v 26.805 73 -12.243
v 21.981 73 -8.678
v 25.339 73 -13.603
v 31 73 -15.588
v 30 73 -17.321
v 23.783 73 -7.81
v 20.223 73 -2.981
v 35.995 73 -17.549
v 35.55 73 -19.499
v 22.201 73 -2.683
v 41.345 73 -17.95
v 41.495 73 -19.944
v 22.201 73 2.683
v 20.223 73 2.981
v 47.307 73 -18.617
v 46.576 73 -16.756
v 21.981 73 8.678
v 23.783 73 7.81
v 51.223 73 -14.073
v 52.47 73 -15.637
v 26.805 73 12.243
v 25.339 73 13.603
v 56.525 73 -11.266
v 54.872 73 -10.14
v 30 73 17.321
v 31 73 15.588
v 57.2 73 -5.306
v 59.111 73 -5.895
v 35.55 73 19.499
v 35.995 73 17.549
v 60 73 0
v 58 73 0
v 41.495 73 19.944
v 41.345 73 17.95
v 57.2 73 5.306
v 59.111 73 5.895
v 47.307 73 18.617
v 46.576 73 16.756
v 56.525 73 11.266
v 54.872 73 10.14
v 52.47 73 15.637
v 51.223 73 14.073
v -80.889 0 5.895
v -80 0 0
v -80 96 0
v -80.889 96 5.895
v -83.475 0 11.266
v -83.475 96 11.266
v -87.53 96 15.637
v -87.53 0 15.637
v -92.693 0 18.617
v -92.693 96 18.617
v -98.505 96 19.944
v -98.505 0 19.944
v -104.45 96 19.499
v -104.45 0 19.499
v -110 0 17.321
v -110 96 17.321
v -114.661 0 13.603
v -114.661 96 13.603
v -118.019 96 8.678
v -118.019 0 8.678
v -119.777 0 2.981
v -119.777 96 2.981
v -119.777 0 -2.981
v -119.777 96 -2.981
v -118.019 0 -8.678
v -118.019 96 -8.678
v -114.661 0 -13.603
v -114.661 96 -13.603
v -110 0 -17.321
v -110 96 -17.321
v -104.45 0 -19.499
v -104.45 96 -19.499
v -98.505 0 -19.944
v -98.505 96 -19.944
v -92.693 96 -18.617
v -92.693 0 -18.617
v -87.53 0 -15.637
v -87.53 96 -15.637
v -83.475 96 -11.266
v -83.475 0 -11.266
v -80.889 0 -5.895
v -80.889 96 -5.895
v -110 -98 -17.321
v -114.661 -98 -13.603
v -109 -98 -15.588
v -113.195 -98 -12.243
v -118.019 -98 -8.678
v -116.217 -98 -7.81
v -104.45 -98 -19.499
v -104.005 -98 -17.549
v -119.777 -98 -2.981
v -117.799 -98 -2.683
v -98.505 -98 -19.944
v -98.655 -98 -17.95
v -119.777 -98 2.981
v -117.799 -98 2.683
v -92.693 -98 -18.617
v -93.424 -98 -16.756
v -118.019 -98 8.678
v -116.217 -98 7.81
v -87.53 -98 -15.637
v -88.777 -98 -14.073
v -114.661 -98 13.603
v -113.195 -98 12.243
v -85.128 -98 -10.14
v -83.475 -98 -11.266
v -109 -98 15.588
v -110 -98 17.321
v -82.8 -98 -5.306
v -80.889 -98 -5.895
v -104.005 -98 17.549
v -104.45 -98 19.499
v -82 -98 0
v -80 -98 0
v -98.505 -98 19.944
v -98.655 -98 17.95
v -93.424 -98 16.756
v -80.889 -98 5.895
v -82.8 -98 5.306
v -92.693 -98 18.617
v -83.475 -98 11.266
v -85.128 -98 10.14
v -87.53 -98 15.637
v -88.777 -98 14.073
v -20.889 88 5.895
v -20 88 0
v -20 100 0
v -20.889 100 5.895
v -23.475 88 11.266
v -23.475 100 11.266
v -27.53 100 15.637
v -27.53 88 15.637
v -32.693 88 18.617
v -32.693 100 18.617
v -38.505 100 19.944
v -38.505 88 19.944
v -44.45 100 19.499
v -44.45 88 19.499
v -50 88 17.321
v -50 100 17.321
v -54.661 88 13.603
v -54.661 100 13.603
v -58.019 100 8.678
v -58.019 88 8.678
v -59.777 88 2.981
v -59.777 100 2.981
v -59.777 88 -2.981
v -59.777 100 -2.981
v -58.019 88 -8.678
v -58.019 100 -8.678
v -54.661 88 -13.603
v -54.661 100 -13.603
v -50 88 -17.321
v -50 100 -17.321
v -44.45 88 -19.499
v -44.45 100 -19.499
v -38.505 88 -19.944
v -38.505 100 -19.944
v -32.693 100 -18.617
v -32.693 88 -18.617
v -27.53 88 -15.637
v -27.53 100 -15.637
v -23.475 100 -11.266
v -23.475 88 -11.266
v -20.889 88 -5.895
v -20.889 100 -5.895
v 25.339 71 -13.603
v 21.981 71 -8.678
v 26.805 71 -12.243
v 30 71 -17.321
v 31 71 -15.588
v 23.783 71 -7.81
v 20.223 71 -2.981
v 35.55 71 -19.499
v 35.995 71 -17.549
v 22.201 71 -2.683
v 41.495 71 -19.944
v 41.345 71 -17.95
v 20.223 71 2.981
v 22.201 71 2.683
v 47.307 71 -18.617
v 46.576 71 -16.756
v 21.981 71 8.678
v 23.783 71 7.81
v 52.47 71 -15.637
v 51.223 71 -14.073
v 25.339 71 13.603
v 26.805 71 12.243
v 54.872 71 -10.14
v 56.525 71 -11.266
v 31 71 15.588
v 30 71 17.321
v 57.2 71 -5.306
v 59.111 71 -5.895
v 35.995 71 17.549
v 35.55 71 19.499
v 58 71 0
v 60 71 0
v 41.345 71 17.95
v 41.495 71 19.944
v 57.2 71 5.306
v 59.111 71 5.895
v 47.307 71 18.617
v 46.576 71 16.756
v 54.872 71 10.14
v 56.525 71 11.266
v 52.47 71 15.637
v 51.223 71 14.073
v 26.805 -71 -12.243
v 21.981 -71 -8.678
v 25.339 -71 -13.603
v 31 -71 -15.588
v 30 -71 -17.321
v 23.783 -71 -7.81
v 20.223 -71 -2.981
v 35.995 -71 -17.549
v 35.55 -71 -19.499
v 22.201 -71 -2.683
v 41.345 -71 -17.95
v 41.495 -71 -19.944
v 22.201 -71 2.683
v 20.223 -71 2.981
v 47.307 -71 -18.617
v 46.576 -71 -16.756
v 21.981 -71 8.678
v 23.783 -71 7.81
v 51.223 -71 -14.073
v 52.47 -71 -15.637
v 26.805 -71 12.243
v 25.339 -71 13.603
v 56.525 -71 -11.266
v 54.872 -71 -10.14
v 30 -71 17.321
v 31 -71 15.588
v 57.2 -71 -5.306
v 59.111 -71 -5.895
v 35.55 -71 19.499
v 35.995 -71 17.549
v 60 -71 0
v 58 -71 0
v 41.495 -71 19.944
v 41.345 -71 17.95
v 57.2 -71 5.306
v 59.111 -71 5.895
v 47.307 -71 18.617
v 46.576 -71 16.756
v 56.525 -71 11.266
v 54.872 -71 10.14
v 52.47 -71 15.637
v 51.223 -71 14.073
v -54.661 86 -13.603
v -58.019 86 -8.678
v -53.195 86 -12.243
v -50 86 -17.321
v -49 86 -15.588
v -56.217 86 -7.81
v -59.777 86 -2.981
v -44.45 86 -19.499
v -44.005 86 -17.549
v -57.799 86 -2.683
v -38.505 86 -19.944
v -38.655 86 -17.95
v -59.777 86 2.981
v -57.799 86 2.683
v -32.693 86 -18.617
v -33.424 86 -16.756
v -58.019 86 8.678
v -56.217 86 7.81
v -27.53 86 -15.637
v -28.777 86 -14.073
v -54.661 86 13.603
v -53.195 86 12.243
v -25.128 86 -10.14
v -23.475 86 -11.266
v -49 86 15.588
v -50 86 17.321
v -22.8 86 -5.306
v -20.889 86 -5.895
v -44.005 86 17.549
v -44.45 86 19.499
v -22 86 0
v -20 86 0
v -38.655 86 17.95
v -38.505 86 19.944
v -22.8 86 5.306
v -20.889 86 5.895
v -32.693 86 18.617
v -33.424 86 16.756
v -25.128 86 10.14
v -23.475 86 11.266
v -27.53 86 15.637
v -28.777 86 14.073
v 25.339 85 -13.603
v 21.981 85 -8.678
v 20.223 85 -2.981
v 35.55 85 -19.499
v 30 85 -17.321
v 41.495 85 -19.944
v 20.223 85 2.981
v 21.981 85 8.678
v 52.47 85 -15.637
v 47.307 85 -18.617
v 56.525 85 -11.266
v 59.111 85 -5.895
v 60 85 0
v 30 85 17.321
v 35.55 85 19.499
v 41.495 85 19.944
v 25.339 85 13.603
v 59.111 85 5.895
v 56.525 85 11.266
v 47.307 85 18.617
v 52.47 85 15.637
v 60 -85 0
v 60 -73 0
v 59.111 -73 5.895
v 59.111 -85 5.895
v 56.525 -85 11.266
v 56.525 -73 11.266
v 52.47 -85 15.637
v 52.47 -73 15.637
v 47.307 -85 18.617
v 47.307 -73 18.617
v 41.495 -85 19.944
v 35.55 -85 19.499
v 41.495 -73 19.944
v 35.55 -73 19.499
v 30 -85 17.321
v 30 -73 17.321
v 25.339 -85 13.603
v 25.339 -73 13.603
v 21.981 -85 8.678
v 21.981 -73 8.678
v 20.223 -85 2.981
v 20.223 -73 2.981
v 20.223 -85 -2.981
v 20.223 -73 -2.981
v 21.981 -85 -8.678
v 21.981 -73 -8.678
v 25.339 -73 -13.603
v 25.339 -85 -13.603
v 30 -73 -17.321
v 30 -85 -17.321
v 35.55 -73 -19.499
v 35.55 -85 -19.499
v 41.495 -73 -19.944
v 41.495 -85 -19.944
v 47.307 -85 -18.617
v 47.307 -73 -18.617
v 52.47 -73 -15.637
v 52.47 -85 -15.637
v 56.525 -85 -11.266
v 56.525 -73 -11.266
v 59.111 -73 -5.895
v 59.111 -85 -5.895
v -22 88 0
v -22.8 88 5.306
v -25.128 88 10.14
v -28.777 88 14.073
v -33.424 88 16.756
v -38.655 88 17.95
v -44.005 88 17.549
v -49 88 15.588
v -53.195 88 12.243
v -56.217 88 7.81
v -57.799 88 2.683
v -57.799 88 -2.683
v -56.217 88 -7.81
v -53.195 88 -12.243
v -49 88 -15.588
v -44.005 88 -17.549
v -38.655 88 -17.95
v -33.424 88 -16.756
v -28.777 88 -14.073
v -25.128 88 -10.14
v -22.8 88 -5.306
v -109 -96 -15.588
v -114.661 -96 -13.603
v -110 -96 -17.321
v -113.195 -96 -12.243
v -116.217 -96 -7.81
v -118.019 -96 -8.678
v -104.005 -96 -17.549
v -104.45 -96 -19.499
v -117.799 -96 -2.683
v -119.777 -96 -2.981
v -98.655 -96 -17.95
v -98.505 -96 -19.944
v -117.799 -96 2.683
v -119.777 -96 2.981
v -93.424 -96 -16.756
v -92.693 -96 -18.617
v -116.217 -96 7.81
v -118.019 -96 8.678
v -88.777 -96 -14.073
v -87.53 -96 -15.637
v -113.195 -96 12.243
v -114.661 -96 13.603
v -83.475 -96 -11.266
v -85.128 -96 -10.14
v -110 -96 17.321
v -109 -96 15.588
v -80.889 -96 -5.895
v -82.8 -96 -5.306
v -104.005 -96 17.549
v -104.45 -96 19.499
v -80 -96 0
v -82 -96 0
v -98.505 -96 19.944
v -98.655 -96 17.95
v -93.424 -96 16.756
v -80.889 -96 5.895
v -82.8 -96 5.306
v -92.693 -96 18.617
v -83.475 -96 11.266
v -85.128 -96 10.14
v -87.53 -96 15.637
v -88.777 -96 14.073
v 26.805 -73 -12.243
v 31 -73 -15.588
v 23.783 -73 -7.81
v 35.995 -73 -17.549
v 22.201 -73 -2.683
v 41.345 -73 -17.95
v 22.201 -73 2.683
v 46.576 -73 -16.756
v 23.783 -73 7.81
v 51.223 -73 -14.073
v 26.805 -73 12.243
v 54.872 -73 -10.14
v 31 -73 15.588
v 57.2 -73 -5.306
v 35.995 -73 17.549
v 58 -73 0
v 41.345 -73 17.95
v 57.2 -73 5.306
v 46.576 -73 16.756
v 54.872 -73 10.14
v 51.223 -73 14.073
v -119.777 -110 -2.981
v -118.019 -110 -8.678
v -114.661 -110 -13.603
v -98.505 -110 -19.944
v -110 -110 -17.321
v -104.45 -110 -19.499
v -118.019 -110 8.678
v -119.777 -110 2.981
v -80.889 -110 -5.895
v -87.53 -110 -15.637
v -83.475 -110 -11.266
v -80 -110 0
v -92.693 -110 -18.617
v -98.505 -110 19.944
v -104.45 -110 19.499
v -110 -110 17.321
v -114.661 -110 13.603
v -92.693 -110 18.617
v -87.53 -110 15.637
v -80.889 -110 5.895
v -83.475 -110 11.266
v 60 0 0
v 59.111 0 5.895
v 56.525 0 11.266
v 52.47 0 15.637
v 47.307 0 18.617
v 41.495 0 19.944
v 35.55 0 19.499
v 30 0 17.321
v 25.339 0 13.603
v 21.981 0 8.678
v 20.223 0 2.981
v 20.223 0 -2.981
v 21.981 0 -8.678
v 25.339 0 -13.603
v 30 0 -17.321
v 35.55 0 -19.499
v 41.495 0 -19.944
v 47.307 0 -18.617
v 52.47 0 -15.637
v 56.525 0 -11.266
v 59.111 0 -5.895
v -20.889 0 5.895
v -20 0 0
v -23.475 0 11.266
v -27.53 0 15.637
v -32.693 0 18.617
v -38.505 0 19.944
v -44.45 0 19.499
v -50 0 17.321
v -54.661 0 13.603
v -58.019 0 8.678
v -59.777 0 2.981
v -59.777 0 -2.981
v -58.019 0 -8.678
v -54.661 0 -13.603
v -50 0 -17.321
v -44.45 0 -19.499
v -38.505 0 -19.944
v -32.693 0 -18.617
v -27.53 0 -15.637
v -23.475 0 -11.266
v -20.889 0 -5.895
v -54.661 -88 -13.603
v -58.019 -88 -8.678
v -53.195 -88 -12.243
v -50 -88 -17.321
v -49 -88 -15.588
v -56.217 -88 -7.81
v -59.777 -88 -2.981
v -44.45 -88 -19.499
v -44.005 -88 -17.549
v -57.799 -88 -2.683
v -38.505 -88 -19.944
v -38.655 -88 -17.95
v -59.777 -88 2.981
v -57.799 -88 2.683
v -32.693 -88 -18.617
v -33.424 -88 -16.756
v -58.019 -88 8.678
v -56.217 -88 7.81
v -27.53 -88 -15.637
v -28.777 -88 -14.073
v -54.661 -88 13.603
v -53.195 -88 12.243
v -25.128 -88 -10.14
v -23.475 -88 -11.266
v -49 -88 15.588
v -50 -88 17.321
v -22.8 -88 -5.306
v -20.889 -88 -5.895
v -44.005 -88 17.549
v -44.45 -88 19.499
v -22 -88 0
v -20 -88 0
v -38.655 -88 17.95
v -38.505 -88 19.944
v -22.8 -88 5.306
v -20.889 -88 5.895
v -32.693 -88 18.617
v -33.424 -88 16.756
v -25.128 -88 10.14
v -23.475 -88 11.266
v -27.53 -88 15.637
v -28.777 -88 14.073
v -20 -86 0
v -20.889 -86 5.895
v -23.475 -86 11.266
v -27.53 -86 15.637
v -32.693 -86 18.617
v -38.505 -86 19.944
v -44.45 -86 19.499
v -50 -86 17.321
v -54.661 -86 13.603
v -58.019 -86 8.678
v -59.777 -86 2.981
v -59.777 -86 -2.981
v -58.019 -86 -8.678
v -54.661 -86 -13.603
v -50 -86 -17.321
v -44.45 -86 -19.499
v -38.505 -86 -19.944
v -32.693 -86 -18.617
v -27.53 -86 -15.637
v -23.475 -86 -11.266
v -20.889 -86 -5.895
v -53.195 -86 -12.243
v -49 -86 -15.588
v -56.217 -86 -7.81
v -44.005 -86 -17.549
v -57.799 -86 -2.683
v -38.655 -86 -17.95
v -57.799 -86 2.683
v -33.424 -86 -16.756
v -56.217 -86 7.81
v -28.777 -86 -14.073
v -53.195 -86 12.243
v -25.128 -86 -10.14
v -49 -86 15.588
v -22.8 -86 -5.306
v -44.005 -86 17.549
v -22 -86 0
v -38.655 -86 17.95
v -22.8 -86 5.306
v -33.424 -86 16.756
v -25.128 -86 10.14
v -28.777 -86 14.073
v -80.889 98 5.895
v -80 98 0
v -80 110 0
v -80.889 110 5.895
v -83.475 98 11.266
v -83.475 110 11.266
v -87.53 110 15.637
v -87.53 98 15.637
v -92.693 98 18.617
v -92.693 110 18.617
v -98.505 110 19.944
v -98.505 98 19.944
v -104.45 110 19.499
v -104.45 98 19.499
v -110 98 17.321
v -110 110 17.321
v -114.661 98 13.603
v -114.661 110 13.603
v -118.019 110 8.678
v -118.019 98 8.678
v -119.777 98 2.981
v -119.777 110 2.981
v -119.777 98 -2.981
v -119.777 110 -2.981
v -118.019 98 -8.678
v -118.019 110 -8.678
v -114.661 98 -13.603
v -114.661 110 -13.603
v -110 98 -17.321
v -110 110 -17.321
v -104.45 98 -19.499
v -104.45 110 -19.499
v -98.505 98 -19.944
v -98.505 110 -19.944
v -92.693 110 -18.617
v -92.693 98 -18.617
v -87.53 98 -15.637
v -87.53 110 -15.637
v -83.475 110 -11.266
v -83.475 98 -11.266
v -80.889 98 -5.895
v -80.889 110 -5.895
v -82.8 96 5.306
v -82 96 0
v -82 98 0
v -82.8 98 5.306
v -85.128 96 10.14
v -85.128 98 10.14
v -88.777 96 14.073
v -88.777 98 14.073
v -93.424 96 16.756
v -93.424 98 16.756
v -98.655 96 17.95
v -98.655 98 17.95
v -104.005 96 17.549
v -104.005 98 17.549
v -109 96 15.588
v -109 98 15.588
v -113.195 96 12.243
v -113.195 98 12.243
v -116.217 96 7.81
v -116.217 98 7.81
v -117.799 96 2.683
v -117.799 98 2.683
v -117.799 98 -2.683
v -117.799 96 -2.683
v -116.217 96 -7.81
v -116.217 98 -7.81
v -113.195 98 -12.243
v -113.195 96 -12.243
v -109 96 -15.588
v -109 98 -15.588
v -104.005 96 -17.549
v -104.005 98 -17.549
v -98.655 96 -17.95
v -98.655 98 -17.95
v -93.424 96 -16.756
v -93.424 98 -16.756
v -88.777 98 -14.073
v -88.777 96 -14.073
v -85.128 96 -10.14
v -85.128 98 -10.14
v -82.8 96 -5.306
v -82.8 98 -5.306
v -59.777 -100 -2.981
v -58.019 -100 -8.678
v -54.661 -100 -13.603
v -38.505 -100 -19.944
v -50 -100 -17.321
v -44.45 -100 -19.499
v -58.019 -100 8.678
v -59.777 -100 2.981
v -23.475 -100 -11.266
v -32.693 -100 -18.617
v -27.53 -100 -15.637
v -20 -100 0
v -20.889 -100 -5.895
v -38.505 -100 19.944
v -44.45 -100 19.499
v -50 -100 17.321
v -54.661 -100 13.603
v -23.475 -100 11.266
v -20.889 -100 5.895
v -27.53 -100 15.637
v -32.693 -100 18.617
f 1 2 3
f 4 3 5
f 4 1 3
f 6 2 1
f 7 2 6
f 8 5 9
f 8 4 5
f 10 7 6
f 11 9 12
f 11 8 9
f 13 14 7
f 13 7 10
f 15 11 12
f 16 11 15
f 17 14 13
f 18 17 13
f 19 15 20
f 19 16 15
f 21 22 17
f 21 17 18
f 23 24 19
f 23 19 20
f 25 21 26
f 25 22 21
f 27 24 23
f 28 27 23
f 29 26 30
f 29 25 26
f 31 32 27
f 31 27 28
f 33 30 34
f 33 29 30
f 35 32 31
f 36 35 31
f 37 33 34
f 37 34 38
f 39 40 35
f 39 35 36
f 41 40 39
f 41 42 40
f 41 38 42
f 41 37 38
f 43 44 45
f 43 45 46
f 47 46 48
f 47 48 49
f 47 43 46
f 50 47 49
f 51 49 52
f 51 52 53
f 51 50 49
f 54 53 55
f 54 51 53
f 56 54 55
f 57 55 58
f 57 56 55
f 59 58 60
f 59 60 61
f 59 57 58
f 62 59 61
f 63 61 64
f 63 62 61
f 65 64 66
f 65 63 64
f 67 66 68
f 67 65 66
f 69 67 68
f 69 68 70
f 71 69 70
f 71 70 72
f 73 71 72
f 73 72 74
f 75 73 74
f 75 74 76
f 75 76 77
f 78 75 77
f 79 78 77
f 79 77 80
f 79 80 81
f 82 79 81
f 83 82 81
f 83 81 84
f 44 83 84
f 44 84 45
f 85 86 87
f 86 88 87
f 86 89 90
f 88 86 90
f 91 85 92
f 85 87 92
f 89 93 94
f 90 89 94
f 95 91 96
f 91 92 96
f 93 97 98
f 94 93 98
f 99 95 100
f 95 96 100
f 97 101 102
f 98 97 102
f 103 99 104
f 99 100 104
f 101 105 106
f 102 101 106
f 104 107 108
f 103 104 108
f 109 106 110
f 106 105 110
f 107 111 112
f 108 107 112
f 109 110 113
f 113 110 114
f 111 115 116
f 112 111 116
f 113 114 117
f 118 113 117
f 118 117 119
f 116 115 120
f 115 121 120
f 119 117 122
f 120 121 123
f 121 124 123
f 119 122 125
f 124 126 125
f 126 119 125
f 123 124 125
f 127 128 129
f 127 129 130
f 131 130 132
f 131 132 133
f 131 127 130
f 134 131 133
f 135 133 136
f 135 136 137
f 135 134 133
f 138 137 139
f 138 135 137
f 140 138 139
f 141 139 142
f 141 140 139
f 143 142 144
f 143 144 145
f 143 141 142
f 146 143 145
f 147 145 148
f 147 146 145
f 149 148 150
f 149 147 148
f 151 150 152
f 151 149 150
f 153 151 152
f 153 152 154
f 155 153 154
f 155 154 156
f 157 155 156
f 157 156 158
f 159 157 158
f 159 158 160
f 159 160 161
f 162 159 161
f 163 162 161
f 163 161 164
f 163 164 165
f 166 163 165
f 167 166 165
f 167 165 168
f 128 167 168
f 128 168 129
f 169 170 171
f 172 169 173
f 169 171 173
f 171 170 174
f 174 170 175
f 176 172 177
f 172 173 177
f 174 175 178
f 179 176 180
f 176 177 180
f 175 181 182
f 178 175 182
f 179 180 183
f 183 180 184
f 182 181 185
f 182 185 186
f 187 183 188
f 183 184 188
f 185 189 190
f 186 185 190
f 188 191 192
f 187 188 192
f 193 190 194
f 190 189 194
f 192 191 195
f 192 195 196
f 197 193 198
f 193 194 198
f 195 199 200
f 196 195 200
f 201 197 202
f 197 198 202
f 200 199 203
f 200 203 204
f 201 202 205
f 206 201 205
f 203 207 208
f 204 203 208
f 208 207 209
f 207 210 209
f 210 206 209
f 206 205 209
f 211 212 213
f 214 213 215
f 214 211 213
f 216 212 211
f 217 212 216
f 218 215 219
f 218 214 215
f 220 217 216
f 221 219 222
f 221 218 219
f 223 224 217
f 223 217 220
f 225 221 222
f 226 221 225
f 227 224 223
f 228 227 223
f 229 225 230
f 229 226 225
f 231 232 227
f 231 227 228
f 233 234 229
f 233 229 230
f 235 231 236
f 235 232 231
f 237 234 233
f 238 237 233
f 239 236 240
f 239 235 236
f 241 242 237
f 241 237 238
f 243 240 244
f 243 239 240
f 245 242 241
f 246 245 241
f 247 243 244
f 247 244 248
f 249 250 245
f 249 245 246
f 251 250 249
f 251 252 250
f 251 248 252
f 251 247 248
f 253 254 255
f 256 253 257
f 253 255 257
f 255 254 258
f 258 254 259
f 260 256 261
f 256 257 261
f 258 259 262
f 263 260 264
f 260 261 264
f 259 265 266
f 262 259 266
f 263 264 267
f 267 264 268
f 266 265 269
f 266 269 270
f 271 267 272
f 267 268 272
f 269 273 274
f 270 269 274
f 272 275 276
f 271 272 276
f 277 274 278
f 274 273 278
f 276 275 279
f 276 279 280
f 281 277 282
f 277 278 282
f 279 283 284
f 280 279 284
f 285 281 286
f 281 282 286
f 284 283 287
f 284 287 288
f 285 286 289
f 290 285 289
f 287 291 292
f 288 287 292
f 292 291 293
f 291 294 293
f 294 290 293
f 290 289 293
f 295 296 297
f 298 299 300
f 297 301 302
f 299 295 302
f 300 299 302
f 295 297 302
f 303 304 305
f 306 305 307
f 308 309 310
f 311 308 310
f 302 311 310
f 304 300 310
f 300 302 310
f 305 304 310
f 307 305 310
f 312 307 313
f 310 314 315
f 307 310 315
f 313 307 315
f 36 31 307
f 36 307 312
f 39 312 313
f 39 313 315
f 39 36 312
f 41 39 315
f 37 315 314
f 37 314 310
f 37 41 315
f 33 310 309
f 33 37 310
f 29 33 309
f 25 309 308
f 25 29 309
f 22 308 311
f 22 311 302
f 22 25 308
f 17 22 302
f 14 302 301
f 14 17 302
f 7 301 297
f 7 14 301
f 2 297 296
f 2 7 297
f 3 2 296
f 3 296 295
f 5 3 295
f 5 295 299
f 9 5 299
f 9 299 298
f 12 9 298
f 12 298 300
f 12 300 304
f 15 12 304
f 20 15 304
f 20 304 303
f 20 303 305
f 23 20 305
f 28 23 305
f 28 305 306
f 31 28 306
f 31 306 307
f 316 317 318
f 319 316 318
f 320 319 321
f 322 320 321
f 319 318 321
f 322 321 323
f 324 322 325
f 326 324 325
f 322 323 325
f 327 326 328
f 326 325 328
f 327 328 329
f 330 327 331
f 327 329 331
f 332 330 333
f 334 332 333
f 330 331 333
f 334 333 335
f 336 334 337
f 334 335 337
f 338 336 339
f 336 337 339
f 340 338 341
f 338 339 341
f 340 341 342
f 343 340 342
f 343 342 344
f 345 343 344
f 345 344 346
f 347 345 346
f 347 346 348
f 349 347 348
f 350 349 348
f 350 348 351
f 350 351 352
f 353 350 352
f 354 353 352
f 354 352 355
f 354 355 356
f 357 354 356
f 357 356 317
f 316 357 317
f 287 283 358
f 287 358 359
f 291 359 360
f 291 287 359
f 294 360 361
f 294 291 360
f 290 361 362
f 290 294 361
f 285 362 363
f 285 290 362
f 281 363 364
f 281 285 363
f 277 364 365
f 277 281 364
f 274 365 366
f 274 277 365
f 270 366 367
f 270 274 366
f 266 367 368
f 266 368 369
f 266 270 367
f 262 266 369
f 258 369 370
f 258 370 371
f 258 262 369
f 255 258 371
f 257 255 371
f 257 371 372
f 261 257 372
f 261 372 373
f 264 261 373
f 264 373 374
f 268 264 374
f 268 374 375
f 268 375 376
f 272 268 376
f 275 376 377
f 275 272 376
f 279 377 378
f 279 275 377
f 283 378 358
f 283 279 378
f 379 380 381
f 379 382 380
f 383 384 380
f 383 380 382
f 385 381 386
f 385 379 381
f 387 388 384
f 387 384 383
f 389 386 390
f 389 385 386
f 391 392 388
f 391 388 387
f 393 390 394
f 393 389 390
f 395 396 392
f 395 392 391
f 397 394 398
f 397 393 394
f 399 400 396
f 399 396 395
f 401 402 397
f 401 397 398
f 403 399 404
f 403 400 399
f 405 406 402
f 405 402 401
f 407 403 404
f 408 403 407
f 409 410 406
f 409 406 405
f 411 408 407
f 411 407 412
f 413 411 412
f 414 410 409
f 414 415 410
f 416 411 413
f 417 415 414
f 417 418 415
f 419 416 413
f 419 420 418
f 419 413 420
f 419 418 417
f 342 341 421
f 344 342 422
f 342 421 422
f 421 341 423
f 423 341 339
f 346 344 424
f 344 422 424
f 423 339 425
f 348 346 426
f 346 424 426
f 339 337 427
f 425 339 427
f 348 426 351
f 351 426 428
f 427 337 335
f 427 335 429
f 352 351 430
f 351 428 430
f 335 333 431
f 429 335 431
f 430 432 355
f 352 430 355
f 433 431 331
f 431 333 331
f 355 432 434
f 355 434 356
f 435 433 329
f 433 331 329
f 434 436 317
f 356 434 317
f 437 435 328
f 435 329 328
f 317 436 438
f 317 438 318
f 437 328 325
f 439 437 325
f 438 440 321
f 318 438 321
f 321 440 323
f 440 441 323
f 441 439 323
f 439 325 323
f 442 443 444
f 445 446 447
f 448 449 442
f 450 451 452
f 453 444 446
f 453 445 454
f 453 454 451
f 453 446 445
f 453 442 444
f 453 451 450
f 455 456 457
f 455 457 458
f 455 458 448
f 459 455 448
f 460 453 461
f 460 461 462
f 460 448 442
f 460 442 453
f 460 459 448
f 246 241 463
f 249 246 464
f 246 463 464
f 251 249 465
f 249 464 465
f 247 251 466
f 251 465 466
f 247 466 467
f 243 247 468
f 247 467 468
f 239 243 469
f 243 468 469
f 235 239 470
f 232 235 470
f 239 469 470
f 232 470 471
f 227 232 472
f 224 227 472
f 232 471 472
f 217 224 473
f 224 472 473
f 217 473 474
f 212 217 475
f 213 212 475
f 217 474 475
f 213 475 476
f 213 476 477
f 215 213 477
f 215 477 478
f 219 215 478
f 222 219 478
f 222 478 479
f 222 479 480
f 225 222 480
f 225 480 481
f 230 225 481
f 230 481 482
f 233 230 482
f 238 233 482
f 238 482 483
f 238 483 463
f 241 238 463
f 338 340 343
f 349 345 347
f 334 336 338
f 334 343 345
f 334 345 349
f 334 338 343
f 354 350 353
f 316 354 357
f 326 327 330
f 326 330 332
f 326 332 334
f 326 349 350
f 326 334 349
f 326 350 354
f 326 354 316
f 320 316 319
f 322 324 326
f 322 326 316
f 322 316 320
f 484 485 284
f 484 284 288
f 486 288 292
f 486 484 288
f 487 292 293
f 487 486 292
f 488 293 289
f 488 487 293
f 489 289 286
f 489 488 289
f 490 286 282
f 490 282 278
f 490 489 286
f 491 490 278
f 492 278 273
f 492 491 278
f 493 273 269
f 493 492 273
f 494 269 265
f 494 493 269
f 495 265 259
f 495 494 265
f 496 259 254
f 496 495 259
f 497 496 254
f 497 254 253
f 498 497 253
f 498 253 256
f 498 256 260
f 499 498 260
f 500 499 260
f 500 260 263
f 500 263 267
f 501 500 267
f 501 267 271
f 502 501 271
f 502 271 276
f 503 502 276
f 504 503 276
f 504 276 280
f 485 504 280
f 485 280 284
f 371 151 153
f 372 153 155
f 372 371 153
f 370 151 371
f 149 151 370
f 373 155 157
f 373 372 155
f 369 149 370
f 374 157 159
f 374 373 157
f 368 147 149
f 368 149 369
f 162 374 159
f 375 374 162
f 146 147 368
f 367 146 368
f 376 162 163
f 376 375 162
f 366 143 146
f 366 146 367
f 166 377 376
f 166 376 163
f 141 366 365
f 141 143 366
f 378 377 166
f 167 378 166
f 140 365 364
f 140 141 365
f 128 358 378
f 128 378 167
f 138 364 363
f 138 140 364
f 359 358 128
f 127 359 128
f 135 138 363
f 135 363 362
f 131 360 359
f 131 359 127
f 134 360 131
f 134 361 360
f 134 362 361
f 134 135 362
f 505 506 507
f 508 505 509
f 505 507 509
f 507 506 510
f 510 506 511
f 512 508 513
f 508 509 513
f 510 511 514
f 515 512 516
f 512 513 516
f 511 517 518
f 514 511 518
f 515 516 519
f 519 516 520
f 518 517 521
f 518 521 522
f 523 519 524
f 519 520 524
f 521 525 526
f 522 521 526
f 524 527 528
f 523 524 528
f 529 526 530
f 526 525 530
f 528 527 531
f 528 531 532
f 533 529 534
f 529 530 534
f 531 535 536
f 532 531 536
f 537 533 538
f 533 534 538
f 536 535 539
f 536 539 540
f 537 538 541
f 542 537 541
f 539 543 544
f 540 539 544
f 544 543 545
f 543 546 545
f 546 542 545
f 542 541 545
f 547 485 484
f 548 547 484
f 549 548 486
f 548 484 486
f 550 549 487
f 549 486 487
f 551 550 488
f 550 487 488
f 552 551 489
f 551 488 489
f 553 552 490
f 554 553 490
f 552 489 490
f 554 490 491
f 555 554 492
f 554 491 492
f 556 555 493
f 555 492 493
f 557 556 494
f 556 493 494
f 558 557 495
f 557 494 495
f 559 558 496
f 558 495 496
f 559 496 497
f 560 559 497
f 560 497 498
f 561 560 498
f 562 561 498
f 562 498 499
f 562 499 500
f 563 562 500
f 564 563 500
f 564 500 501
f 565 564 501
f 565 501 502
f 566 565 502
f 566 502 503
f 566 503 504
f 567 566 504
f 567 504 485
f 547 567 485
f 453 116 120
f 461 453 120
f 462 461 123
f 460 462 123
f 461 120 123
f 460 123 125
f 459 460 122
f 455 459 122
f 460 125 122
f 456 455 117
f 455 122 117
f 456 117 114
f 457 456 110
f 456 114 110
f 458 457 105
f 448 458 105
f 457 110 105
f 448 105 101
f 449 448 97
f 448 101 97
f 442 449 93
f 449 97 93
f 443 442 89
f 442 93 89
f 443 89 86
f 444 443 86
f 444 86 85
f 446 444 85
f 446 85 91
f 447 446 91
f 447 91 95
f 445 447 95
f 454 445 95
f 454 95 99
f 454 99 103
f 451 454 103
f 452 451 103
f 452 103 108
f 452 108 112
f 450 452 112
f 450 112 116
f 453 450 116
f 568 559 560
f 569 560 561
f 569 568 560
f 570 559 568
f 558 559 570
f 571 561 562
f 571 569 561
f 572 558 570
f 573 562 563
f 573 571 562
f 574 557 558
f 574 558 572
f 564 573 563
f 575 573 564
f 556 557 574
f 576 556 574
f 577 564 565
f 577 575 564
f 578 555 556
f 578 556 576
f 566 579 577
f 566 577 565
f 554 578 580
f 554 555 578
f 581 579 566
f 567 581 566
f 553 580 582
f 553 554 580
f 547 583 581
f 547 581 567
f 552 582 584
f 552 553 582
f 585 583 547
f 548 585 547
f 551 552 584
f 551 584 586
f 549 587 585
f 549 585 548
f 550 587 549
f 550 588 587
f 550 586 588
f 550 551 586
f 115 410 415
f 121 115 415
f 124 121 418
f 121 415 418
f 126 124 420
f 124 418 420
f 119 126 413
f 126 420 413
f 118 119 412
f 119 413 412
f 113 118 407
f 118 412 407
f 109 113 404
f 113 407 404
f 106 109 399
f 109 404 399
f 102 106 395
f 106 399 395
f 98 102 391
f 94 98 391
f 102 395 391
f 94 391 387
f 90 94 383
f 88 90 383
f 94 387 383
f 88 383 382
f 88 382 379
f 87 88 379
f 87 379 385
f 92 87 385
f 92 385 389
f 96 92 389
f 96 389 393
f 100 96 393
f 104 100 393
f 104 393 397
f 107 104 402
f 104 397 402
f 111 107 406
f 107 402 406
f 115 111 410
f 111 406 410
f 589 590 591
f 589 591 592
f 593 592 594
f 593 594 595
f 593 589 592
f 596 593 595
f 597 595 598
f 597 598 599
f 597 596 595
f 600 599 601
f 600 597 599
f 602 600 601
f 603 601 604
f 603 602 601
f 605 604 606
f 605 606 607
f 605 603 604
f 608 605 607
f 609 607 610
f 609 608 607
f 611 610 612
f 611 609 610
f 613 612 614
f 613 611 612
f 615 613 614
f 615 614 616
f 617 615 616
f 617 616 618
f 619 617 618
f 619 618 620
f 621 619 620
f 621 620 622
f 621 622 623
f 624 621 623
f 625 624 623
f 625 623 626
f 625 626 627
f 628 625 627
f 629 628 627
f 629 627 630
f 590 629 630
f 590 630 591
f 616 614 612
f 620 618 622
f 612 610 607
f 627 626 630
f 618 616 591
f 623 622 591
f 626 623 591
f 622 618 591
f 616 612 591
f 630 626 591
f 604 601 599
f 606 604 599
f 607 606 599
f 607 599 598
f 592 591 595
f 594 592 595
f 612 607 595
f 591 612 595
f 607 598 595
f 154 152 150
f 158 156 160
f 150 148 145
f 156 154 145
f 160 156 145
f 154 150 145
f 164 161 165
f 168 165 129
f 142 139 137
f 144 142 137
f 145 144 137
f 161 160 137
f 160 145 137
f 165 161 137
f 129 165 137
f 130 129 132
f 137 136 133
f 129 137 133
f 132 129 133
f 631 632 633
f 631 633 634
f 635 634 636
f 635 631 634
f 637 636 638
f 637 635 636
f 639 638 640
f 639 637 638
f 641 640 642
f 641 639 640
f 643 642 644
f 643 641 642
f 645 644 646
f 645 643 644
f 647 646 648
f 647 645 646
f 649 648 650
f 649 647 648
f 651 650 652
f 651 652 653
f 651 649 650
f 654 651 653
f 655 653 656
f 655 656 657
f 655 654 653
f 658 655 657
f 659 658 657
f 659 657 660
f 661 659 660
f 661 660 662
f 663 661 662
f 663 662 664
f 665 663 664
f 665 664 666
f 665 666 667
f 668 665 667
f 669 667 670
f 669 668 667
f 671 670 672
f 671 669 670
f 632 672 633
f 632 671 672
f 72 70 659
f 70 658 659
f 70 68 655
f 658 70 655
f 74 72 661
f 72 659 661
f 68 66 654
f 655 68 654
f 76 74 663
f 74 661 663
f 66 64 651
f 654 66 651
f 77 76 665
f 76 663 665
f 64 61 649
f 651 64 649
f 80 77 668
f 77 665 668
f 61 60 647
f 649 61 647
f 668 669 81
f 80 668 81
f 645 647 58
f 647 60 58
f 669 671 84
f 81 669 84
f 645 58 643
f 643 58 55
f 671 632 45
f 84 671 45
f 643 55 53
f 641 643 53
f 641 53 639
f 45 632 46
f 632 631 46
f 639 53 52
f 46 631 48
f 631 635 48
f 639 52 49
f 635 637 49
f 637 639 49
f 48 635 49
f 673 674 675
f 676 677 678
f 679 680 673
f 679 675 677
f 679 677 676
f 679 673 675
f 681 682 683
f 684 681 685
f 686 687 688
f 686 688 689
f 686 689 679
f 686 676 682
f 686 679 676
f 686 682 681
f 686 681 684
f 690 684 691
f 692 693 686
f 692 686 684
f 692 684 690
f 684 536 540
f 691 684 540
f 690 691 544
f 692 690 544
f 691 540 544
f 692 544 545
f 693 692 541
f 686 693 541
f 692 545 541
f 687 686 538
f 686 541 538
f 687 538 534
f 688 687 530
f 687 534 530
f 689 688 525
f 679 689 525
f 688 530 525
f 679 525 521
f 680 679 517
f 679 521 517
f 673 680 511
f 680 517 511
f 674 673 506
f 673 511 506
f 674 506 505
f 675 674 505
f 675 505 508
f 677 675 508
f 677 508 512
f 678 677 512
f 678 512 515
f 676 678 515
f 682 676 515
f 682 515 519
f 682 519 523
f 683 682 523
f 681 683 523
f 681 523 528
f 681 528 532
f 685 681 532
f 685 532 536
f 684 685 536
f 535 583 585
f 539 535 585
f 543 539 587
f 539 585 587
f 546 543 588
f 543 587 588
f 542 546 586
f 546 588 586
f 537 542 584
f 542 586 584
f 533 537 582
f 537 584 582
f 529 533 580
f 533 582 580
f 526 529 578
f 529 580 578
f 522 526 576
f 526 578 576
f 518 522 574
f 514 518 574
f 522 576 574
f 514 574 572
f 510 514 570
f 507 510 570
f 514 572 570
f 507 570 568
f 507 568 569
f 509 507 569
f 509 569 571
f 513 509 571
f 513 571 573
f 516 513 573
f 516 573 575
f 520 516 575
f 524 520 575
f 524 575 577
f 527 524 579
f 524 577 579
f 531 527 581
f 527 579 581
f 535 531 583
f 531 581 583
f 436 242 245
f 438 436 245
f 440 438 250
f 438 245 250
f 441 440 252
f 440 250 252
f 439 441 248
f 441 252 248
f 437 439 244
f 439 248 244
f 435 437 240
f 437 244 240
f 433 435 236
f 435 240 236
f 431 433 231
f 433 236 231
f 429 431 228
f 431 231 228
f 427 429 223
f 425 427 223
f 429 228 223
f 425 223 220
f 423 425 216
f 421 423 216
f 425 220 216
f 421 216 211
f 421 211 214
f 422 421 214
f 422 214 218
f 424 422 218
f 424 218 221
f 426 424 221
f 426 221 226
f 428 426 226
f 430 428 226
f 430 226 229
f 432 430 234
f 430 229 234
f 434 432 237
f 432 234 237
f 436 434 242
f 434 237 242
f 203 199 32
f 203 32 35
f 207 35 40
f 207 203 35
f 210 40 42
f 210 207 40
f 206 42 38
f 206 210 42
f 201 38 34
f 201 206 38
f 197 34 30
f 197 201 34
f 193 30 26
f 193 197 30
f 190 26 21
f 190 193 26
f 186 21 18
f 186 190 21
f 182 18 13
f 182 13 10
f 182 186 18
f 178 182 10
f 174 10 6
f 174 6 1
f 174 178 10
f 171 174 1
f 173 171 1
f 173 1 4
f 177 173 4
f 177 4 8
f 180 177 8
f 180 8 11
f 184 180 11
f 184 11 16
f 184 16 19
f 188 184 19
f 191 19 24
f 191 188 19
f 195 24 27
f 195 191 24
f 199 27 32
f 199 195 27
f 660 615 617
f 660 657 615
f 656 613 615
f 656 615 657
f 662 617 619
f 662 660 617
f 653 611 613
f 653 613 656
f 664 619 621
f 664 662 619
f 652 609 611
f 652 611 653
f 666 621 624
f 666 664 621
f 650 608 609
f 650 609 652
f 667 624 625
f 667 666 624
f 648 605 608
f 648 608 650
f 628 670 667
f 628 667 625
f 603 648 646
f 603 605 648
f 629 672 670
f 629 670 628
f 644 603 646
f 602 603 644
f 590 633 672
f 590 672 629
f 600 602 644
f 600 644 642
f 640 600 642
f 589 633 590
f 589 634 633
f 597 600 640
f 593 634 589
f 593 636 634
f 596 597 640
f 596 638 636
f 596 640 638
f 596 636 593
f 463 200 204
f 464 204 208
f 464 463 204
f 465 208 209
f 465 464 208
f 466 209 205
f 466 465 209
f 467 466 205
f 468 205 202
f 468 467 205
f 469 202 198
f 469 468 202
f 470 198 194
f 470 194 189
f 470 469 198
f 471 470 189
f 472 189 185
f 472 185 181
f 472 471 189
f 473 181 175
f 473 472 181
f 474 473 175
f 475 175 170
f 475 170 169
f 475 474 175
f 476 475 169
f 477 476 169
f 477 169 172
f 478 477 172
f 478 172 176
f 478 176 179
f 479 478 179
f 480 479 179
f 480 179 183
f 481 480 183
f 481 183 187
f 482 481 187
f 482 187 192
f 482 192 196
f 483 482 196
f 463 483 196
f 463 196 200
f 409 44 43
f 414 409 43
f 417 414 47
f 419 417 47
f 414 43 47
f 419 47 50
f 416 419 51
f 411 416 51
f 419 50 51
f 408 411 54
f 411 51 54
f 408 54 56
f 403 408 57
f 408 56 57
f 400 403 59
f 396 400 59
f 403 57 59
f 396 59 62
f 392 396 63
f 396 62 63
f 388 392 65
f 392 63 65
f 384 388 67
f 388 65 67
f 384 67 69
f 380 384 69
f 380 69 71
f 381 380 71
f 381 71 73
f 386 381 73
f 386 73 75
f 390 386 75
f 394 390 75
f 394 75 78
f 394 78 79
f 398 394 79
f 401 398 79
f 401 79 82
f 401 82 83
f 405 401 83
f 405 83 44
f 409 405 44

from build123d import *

# Parameters (mm, degrees)
F3_R      = 20
F4_DEPTH  = 110
F6_R      = 20
F6_R_2    = 18
F7_DEPTH  = 2
F9_R      = 20
F10_DEPTH = 100
F12_R     = 20
F12_R_2   = 18
F13_DEPTH = 2
F15_R     = 20
F16_DEPTH = 85
F18_R     = 20
F18_R_2   = 18
F19_DEPTH = 2


with BuildPart() as f4:
    # F3 (on Front) → F4 (new body)
    with BuildSketch(Plane.XZ):
        with Locations((-100, 0)):
            Circle(F3_R)
    extrude(amount=F4_DEPTH)

    # F6 (on offset) → F7 (cut)
    with BuildSketch(Plane.XZ.offset(96)):
        with Locations((-100, 0)):
            Circle(F6_R)
        with Locations((-100, 0)):
            Circle(F6_R_2, mode=Mode.SUBTRACT)
    extrude(amount=F7_DEPTH, mode=Mode.SUBTRACT)

    # F8: F4 across plane


with BuildPart() as f4_1:
    add(f4.part)
    add(f4.part.mirror(Plane.XZ))


with BuildPart() as f10:
    # F9 (on Front) → F10 (new body)
    with BuildSketch(Plane.XZ):
        with Locations((-40, 0)):
            Circle(F9_R)
    extrude(amount=F10_DEPTH)

    # F12 (on offset) → F13 (cut)
    with BuildSketch(Plane.XZ.offset(86)):
        with Locations((-40, 0)):
            Circle(F12_R)
        with Locations((-40, 0)):
            Circle(F12_R_2, mode=Mode.SUBTRACT)
    extrude(amount=F13_DEPTH, mode=Mode.SUBTRACT)

    # F14: F10 across plane


with BuildPart() as f10_1:
    add(f10.part)
    add(f10.part.mirror(Plane.XZ))


with BuildPart() as f16:
    # F15 (on Front) → F16 (new body)
    with BuildSketch(Plane.XZ):
        with Locations((40, 0)):
            Circle(F15_R)
    extrude(amount=F16_DEPTH)

    # F18 (on offset) → F19 (cut)
    with BuildSketch(Plane.XZ.offset(71)):
        with Locations((40, 0)):
            Circle(F18_R)
        with Locations((40, 0)):
            Circle(F18_R_2, mode=Mode.SUBTRACT)
    extrude(amount=F19_DEPTH, mode=Mode.SUBTRACT)

    # F20: F16 across plane


with BuildPart() as f16_1:
    add(f16.part)
    add(f16.part.mirror(Plane.XZ))


solid = Compound([f4_1.part, f10_1.part, f16_1.part])
